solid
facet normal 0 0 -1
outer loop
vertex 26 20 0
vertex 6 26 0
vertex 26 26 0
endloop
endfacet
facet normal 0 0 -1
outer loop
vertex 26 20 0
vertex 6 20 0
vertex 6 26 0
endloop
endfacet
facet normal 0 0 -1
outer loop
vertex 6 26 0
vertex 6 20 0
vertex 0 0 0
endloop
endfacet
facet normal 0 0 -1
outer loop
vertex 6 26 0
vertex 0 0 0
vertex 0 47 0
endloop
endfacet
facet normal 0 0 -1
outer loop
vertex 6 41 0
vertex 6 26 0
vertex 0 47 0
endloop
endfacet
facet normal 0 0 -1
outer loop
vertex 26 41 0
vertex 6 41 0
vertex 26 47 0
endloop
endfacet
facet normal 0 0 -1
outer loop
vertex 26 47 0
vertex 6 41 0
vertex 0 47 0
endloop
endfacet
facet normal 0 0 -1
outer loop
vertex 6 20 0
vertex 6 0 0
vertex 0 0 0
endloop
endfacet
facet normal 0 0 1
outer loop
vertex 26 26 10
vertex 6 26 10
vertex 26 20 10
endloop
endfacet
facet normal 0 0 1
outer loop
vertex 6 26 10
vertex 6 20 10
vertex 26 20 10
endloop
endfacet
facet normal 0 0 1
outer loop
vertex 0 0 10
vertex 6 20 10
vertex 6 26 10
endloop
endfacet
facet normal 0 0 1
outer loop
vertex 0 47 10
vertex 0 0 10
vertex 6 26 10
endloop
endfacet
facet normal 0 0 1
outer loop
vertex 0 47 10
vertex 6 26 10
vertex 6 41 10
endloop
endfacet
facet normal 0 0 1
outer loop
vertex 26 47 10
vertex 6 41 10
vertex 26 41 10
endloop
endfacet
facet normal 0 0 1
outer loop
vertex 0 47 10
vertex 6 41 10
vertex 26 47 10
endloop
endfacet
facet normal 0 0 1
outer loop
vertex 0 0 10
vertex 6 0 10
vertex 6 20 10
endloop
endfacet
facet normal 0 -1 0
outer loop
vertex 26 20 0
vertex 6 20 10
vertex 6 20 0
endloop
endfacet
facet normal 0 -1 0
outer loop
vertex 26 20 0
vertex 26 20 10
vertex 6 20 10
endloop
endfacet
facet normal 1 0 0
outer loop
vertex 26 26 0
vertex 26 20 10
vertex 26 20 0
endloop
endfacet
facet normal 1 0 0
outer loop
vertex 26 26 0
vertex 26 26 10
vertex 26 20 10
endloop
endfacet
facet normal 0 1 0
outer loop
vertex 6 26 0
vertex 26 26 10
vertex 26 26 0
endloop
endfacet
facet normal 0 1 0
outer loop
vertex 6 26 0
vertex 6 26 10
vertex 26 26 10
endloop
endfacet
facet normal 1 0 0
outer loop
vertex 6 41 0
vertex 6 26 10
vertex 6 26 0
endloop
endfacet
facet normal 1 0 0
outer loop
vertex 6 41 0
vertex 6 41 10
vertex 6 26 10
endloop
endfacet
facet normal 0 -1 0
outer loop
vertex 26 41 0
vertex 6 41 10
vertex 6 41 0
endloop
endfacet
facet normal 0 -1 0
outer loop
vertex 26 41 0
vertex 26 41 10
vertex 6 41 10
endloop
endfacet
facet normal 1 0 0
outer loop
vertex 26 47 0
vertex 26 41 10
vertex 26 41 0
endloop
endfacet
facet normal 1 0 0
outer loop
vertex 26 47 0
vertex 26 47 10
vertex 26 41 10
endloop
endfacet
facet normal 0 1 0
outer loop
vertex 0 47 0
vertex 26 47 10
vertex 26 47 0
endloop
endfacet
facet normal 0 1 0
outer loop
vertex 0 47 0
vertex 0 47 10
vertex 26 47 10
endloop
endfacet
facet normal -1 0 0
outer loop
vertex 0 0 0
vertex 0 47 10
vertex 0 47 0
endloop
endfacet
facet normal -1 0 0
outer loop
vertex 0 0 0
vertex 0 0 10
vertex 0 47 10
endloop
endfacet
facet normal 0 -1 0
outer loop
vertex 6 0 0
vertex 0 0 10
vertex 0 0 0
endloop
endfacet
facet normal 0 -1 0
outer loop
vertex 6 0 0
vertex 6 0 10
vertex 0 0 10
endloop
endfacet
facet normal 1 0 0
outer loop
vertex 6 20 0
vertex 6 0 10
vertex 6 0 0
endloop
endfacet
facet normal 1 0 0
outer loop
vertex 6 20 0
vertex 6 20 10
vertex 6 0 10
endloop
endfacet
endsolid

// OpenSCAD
/// F

linear_extrude(10) {
  union() {
    square([6, 47]);
    translate([0, 20])
      square([26, 6]);
    translate([0, 41])
      square([26, 6]);
  }
}
